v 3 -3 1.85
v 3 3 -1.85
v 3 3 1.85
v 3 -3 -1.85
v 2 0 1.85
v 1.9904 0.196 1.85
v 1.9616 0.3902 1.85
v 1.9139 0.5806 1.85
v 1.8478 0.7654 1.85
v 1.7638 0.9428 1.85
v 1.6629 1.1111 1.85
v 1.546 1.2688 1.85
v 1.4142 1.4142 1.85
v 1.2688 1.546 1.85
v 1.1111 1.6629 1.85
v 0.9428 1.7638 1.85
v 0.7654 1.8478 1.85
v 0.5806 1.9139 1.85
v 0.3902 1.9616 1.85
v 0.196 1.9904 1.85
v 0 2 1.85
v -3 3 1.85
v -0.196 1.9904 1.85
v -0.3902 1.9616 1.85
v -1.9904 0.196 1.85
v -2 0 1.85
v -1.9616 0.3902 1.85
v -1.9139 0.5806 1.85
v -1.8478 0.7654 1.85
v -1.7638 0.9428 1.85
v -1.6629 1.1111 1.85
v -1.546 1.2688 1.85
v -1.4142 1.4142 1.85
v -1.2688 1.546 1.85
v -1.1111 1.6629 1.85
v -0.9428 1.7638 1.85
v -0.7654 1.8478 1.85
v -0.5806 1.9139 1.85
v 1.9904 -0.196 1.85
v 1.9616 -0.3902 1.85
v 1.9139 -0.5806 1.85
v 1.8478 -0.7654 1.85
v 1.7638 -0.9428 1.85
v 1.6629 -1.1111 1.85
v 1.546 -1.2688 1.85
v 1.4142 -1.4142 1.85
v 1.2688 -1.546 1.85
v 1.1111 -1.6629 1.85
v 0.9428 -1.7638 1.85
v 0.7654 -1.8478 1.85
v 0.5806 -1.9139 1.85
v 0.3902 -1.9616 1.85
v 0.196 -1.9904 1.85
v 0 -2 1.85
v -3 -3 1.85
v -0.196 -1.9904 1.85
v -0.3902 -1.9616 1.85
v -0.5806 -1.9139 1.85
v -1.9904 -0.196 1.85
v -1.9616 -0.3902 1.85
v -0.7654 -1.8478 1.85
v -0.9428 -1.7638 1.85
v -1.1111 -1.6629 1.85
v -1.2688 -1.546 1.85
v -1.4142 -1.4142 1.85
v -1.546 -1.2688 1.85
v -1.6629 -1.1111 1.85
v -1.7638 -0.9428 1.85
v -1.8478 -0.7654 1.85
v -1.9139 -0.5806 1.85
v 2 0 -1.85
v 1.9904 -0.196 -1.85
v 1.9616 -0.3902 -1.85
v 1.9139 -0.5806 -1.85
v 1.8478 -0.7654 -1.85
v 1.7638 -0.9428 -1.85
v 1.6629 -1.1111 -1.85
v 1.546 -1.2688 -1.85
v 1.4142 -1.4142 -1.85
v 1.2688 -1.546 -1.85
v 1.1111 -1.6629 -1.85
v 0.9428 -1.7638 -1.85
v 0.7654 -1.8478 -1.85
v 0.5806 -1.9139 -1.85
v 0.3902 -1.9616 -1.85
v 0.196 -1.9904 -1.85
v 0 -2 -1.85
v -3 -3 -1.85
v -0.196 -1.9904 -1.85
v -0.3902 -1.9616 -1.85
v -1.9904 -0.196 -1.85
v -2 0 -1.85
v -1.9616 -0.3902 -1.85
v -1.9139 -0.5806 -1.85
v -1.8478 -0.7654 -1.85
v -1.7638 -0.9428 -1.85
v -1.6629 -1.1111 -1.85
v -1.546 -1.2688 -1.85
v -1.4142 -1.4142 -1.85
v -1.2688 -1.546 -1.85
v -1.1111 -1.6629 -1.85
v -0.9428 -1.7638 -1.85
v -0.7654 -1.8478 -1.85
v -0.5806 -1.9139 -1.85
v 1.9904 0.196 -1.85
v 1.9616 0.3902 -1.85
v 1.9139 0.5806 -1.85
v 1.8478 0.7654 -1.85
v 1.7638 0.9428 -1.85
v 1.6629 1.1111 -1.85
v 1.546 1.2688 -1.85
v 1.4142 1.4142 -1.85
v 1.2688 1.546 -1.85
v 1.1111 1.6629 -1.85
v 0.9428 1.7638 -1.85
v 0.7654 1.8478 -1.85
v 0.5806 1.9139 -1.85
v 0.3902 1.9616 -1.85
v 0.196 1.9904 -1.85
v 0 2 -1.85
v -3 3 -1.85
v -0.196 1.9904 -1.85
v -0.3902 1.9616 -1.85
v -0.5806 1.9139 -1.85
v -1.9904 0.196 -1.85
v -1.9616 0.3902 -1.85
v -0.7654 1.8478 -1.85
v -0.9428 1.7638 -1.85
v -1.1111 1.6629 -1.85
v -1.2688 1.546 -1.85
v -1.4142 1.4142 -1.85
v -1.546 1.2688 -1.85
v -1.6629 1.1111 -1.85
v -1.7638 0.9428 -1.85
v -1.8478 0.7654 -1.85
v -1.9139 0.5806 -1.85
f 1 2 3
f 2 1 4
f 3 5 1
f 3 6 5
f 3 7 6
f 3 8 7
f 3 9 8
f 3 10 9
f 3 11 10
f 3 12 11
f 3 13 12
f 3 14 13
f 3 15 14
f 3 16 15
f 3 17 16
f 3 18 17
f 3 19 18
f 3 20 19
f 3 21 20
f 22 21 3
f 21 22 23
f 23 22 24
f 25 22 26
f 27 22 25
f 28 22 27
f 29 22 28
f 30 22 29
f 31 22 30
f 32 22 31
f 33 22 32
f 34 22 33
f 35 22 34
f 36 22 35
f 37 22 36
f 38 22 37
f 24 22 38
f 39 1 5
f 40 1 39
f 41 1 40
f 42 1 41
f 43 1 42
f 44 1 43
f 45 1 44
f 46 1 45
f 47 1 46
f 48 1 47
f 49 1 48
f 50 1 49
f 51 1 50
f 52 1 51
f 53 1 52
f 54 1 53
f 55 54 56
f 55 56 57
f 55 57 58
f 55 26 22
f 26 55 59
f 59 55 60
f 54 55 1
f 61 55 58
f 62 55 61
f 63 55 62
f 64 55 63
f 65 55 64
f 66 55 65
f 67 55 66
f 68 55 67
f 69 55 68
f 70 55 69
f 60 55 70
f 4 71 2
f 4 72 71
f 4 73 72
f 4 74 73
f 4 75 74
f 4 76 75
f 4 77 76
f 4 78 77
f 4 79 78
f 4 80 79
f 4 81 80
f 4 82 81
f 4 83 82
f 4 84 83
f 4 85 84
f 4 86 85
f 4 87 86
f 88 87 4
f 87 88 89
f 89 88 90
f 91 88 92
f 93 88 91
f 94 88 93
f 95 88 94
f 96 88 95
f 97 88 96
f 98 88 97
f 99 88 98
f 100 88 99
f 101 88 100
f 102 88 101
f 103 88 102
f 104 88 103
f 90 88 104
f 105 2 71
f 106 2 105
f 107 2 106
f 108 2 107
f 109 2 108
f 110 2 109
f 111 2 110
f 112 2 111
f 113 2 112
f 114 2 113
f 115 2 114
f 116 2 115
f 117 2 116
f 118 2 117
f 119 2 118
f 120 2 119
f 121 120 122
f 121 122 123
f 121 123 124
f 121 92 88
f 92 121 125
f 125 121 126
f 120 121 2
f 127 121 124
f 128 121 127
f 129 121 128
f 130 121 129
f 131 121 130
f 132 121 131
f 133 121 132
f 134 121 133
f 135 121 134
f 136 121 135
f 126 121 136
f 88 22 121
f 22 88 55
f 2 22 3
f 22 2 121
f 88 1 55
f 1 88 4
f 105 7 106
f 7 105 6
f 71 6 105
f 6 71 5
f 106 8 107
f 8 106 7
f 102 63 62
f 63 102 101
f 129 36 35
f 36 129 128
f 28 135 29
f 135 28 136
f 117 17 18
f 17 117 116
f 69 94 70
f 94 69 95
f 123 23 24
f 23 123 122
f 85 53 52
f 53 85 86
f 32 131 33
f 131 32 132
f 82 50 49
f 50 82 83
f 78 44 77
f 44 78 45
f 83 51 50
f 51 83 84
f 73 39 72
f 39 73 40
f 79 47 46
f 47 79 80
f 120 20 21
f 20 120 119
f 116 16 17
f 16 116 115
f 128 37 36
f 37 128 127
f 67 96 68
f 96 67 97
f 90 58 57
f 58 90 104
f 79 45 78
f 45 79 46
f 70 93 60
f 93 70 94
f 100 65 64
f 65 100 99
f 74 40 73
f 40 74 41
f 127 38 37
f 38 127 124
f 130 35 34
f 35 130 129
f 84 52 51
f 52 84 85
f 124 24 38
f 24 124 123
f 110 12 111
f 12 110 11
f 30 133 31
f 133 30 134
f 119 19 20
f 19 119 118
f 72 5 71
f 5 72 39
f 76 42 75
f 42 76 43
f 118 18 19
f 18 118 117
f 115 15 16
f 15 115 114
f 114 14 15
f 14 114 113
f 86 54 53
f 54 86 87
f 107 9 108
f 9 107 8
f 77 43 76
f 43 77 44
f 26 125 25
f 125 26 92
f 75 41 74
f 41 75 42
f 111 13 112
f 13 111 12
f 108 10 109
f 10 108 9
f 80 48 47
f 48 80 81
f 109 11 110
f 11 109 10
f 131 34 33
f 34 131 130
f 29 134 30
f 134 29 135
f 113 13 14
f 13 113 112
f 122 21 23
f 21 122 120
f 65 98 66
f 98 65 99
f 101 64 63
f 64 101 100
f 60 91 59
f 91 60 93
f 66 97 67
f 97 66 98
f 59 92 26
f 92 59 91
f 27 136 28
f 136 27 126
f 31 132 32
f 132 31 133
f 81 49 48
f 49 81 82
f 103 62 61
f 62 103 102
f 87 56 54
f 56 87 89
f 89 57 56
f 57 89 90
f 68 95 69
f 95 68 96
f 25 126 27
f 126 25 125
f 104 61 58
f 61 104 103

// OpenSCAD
module t_slot_nut() {
    difference() {
        // Main body of the nut
        cube([6.0, 6.0, 3.7], center = true);
        
        // Hole for the screw
        translate([0, 0, -3.7/2])
            cylinder(h = 3.7, r = 2.0, $fn = 64);
    }
}

t_slot_nut();
